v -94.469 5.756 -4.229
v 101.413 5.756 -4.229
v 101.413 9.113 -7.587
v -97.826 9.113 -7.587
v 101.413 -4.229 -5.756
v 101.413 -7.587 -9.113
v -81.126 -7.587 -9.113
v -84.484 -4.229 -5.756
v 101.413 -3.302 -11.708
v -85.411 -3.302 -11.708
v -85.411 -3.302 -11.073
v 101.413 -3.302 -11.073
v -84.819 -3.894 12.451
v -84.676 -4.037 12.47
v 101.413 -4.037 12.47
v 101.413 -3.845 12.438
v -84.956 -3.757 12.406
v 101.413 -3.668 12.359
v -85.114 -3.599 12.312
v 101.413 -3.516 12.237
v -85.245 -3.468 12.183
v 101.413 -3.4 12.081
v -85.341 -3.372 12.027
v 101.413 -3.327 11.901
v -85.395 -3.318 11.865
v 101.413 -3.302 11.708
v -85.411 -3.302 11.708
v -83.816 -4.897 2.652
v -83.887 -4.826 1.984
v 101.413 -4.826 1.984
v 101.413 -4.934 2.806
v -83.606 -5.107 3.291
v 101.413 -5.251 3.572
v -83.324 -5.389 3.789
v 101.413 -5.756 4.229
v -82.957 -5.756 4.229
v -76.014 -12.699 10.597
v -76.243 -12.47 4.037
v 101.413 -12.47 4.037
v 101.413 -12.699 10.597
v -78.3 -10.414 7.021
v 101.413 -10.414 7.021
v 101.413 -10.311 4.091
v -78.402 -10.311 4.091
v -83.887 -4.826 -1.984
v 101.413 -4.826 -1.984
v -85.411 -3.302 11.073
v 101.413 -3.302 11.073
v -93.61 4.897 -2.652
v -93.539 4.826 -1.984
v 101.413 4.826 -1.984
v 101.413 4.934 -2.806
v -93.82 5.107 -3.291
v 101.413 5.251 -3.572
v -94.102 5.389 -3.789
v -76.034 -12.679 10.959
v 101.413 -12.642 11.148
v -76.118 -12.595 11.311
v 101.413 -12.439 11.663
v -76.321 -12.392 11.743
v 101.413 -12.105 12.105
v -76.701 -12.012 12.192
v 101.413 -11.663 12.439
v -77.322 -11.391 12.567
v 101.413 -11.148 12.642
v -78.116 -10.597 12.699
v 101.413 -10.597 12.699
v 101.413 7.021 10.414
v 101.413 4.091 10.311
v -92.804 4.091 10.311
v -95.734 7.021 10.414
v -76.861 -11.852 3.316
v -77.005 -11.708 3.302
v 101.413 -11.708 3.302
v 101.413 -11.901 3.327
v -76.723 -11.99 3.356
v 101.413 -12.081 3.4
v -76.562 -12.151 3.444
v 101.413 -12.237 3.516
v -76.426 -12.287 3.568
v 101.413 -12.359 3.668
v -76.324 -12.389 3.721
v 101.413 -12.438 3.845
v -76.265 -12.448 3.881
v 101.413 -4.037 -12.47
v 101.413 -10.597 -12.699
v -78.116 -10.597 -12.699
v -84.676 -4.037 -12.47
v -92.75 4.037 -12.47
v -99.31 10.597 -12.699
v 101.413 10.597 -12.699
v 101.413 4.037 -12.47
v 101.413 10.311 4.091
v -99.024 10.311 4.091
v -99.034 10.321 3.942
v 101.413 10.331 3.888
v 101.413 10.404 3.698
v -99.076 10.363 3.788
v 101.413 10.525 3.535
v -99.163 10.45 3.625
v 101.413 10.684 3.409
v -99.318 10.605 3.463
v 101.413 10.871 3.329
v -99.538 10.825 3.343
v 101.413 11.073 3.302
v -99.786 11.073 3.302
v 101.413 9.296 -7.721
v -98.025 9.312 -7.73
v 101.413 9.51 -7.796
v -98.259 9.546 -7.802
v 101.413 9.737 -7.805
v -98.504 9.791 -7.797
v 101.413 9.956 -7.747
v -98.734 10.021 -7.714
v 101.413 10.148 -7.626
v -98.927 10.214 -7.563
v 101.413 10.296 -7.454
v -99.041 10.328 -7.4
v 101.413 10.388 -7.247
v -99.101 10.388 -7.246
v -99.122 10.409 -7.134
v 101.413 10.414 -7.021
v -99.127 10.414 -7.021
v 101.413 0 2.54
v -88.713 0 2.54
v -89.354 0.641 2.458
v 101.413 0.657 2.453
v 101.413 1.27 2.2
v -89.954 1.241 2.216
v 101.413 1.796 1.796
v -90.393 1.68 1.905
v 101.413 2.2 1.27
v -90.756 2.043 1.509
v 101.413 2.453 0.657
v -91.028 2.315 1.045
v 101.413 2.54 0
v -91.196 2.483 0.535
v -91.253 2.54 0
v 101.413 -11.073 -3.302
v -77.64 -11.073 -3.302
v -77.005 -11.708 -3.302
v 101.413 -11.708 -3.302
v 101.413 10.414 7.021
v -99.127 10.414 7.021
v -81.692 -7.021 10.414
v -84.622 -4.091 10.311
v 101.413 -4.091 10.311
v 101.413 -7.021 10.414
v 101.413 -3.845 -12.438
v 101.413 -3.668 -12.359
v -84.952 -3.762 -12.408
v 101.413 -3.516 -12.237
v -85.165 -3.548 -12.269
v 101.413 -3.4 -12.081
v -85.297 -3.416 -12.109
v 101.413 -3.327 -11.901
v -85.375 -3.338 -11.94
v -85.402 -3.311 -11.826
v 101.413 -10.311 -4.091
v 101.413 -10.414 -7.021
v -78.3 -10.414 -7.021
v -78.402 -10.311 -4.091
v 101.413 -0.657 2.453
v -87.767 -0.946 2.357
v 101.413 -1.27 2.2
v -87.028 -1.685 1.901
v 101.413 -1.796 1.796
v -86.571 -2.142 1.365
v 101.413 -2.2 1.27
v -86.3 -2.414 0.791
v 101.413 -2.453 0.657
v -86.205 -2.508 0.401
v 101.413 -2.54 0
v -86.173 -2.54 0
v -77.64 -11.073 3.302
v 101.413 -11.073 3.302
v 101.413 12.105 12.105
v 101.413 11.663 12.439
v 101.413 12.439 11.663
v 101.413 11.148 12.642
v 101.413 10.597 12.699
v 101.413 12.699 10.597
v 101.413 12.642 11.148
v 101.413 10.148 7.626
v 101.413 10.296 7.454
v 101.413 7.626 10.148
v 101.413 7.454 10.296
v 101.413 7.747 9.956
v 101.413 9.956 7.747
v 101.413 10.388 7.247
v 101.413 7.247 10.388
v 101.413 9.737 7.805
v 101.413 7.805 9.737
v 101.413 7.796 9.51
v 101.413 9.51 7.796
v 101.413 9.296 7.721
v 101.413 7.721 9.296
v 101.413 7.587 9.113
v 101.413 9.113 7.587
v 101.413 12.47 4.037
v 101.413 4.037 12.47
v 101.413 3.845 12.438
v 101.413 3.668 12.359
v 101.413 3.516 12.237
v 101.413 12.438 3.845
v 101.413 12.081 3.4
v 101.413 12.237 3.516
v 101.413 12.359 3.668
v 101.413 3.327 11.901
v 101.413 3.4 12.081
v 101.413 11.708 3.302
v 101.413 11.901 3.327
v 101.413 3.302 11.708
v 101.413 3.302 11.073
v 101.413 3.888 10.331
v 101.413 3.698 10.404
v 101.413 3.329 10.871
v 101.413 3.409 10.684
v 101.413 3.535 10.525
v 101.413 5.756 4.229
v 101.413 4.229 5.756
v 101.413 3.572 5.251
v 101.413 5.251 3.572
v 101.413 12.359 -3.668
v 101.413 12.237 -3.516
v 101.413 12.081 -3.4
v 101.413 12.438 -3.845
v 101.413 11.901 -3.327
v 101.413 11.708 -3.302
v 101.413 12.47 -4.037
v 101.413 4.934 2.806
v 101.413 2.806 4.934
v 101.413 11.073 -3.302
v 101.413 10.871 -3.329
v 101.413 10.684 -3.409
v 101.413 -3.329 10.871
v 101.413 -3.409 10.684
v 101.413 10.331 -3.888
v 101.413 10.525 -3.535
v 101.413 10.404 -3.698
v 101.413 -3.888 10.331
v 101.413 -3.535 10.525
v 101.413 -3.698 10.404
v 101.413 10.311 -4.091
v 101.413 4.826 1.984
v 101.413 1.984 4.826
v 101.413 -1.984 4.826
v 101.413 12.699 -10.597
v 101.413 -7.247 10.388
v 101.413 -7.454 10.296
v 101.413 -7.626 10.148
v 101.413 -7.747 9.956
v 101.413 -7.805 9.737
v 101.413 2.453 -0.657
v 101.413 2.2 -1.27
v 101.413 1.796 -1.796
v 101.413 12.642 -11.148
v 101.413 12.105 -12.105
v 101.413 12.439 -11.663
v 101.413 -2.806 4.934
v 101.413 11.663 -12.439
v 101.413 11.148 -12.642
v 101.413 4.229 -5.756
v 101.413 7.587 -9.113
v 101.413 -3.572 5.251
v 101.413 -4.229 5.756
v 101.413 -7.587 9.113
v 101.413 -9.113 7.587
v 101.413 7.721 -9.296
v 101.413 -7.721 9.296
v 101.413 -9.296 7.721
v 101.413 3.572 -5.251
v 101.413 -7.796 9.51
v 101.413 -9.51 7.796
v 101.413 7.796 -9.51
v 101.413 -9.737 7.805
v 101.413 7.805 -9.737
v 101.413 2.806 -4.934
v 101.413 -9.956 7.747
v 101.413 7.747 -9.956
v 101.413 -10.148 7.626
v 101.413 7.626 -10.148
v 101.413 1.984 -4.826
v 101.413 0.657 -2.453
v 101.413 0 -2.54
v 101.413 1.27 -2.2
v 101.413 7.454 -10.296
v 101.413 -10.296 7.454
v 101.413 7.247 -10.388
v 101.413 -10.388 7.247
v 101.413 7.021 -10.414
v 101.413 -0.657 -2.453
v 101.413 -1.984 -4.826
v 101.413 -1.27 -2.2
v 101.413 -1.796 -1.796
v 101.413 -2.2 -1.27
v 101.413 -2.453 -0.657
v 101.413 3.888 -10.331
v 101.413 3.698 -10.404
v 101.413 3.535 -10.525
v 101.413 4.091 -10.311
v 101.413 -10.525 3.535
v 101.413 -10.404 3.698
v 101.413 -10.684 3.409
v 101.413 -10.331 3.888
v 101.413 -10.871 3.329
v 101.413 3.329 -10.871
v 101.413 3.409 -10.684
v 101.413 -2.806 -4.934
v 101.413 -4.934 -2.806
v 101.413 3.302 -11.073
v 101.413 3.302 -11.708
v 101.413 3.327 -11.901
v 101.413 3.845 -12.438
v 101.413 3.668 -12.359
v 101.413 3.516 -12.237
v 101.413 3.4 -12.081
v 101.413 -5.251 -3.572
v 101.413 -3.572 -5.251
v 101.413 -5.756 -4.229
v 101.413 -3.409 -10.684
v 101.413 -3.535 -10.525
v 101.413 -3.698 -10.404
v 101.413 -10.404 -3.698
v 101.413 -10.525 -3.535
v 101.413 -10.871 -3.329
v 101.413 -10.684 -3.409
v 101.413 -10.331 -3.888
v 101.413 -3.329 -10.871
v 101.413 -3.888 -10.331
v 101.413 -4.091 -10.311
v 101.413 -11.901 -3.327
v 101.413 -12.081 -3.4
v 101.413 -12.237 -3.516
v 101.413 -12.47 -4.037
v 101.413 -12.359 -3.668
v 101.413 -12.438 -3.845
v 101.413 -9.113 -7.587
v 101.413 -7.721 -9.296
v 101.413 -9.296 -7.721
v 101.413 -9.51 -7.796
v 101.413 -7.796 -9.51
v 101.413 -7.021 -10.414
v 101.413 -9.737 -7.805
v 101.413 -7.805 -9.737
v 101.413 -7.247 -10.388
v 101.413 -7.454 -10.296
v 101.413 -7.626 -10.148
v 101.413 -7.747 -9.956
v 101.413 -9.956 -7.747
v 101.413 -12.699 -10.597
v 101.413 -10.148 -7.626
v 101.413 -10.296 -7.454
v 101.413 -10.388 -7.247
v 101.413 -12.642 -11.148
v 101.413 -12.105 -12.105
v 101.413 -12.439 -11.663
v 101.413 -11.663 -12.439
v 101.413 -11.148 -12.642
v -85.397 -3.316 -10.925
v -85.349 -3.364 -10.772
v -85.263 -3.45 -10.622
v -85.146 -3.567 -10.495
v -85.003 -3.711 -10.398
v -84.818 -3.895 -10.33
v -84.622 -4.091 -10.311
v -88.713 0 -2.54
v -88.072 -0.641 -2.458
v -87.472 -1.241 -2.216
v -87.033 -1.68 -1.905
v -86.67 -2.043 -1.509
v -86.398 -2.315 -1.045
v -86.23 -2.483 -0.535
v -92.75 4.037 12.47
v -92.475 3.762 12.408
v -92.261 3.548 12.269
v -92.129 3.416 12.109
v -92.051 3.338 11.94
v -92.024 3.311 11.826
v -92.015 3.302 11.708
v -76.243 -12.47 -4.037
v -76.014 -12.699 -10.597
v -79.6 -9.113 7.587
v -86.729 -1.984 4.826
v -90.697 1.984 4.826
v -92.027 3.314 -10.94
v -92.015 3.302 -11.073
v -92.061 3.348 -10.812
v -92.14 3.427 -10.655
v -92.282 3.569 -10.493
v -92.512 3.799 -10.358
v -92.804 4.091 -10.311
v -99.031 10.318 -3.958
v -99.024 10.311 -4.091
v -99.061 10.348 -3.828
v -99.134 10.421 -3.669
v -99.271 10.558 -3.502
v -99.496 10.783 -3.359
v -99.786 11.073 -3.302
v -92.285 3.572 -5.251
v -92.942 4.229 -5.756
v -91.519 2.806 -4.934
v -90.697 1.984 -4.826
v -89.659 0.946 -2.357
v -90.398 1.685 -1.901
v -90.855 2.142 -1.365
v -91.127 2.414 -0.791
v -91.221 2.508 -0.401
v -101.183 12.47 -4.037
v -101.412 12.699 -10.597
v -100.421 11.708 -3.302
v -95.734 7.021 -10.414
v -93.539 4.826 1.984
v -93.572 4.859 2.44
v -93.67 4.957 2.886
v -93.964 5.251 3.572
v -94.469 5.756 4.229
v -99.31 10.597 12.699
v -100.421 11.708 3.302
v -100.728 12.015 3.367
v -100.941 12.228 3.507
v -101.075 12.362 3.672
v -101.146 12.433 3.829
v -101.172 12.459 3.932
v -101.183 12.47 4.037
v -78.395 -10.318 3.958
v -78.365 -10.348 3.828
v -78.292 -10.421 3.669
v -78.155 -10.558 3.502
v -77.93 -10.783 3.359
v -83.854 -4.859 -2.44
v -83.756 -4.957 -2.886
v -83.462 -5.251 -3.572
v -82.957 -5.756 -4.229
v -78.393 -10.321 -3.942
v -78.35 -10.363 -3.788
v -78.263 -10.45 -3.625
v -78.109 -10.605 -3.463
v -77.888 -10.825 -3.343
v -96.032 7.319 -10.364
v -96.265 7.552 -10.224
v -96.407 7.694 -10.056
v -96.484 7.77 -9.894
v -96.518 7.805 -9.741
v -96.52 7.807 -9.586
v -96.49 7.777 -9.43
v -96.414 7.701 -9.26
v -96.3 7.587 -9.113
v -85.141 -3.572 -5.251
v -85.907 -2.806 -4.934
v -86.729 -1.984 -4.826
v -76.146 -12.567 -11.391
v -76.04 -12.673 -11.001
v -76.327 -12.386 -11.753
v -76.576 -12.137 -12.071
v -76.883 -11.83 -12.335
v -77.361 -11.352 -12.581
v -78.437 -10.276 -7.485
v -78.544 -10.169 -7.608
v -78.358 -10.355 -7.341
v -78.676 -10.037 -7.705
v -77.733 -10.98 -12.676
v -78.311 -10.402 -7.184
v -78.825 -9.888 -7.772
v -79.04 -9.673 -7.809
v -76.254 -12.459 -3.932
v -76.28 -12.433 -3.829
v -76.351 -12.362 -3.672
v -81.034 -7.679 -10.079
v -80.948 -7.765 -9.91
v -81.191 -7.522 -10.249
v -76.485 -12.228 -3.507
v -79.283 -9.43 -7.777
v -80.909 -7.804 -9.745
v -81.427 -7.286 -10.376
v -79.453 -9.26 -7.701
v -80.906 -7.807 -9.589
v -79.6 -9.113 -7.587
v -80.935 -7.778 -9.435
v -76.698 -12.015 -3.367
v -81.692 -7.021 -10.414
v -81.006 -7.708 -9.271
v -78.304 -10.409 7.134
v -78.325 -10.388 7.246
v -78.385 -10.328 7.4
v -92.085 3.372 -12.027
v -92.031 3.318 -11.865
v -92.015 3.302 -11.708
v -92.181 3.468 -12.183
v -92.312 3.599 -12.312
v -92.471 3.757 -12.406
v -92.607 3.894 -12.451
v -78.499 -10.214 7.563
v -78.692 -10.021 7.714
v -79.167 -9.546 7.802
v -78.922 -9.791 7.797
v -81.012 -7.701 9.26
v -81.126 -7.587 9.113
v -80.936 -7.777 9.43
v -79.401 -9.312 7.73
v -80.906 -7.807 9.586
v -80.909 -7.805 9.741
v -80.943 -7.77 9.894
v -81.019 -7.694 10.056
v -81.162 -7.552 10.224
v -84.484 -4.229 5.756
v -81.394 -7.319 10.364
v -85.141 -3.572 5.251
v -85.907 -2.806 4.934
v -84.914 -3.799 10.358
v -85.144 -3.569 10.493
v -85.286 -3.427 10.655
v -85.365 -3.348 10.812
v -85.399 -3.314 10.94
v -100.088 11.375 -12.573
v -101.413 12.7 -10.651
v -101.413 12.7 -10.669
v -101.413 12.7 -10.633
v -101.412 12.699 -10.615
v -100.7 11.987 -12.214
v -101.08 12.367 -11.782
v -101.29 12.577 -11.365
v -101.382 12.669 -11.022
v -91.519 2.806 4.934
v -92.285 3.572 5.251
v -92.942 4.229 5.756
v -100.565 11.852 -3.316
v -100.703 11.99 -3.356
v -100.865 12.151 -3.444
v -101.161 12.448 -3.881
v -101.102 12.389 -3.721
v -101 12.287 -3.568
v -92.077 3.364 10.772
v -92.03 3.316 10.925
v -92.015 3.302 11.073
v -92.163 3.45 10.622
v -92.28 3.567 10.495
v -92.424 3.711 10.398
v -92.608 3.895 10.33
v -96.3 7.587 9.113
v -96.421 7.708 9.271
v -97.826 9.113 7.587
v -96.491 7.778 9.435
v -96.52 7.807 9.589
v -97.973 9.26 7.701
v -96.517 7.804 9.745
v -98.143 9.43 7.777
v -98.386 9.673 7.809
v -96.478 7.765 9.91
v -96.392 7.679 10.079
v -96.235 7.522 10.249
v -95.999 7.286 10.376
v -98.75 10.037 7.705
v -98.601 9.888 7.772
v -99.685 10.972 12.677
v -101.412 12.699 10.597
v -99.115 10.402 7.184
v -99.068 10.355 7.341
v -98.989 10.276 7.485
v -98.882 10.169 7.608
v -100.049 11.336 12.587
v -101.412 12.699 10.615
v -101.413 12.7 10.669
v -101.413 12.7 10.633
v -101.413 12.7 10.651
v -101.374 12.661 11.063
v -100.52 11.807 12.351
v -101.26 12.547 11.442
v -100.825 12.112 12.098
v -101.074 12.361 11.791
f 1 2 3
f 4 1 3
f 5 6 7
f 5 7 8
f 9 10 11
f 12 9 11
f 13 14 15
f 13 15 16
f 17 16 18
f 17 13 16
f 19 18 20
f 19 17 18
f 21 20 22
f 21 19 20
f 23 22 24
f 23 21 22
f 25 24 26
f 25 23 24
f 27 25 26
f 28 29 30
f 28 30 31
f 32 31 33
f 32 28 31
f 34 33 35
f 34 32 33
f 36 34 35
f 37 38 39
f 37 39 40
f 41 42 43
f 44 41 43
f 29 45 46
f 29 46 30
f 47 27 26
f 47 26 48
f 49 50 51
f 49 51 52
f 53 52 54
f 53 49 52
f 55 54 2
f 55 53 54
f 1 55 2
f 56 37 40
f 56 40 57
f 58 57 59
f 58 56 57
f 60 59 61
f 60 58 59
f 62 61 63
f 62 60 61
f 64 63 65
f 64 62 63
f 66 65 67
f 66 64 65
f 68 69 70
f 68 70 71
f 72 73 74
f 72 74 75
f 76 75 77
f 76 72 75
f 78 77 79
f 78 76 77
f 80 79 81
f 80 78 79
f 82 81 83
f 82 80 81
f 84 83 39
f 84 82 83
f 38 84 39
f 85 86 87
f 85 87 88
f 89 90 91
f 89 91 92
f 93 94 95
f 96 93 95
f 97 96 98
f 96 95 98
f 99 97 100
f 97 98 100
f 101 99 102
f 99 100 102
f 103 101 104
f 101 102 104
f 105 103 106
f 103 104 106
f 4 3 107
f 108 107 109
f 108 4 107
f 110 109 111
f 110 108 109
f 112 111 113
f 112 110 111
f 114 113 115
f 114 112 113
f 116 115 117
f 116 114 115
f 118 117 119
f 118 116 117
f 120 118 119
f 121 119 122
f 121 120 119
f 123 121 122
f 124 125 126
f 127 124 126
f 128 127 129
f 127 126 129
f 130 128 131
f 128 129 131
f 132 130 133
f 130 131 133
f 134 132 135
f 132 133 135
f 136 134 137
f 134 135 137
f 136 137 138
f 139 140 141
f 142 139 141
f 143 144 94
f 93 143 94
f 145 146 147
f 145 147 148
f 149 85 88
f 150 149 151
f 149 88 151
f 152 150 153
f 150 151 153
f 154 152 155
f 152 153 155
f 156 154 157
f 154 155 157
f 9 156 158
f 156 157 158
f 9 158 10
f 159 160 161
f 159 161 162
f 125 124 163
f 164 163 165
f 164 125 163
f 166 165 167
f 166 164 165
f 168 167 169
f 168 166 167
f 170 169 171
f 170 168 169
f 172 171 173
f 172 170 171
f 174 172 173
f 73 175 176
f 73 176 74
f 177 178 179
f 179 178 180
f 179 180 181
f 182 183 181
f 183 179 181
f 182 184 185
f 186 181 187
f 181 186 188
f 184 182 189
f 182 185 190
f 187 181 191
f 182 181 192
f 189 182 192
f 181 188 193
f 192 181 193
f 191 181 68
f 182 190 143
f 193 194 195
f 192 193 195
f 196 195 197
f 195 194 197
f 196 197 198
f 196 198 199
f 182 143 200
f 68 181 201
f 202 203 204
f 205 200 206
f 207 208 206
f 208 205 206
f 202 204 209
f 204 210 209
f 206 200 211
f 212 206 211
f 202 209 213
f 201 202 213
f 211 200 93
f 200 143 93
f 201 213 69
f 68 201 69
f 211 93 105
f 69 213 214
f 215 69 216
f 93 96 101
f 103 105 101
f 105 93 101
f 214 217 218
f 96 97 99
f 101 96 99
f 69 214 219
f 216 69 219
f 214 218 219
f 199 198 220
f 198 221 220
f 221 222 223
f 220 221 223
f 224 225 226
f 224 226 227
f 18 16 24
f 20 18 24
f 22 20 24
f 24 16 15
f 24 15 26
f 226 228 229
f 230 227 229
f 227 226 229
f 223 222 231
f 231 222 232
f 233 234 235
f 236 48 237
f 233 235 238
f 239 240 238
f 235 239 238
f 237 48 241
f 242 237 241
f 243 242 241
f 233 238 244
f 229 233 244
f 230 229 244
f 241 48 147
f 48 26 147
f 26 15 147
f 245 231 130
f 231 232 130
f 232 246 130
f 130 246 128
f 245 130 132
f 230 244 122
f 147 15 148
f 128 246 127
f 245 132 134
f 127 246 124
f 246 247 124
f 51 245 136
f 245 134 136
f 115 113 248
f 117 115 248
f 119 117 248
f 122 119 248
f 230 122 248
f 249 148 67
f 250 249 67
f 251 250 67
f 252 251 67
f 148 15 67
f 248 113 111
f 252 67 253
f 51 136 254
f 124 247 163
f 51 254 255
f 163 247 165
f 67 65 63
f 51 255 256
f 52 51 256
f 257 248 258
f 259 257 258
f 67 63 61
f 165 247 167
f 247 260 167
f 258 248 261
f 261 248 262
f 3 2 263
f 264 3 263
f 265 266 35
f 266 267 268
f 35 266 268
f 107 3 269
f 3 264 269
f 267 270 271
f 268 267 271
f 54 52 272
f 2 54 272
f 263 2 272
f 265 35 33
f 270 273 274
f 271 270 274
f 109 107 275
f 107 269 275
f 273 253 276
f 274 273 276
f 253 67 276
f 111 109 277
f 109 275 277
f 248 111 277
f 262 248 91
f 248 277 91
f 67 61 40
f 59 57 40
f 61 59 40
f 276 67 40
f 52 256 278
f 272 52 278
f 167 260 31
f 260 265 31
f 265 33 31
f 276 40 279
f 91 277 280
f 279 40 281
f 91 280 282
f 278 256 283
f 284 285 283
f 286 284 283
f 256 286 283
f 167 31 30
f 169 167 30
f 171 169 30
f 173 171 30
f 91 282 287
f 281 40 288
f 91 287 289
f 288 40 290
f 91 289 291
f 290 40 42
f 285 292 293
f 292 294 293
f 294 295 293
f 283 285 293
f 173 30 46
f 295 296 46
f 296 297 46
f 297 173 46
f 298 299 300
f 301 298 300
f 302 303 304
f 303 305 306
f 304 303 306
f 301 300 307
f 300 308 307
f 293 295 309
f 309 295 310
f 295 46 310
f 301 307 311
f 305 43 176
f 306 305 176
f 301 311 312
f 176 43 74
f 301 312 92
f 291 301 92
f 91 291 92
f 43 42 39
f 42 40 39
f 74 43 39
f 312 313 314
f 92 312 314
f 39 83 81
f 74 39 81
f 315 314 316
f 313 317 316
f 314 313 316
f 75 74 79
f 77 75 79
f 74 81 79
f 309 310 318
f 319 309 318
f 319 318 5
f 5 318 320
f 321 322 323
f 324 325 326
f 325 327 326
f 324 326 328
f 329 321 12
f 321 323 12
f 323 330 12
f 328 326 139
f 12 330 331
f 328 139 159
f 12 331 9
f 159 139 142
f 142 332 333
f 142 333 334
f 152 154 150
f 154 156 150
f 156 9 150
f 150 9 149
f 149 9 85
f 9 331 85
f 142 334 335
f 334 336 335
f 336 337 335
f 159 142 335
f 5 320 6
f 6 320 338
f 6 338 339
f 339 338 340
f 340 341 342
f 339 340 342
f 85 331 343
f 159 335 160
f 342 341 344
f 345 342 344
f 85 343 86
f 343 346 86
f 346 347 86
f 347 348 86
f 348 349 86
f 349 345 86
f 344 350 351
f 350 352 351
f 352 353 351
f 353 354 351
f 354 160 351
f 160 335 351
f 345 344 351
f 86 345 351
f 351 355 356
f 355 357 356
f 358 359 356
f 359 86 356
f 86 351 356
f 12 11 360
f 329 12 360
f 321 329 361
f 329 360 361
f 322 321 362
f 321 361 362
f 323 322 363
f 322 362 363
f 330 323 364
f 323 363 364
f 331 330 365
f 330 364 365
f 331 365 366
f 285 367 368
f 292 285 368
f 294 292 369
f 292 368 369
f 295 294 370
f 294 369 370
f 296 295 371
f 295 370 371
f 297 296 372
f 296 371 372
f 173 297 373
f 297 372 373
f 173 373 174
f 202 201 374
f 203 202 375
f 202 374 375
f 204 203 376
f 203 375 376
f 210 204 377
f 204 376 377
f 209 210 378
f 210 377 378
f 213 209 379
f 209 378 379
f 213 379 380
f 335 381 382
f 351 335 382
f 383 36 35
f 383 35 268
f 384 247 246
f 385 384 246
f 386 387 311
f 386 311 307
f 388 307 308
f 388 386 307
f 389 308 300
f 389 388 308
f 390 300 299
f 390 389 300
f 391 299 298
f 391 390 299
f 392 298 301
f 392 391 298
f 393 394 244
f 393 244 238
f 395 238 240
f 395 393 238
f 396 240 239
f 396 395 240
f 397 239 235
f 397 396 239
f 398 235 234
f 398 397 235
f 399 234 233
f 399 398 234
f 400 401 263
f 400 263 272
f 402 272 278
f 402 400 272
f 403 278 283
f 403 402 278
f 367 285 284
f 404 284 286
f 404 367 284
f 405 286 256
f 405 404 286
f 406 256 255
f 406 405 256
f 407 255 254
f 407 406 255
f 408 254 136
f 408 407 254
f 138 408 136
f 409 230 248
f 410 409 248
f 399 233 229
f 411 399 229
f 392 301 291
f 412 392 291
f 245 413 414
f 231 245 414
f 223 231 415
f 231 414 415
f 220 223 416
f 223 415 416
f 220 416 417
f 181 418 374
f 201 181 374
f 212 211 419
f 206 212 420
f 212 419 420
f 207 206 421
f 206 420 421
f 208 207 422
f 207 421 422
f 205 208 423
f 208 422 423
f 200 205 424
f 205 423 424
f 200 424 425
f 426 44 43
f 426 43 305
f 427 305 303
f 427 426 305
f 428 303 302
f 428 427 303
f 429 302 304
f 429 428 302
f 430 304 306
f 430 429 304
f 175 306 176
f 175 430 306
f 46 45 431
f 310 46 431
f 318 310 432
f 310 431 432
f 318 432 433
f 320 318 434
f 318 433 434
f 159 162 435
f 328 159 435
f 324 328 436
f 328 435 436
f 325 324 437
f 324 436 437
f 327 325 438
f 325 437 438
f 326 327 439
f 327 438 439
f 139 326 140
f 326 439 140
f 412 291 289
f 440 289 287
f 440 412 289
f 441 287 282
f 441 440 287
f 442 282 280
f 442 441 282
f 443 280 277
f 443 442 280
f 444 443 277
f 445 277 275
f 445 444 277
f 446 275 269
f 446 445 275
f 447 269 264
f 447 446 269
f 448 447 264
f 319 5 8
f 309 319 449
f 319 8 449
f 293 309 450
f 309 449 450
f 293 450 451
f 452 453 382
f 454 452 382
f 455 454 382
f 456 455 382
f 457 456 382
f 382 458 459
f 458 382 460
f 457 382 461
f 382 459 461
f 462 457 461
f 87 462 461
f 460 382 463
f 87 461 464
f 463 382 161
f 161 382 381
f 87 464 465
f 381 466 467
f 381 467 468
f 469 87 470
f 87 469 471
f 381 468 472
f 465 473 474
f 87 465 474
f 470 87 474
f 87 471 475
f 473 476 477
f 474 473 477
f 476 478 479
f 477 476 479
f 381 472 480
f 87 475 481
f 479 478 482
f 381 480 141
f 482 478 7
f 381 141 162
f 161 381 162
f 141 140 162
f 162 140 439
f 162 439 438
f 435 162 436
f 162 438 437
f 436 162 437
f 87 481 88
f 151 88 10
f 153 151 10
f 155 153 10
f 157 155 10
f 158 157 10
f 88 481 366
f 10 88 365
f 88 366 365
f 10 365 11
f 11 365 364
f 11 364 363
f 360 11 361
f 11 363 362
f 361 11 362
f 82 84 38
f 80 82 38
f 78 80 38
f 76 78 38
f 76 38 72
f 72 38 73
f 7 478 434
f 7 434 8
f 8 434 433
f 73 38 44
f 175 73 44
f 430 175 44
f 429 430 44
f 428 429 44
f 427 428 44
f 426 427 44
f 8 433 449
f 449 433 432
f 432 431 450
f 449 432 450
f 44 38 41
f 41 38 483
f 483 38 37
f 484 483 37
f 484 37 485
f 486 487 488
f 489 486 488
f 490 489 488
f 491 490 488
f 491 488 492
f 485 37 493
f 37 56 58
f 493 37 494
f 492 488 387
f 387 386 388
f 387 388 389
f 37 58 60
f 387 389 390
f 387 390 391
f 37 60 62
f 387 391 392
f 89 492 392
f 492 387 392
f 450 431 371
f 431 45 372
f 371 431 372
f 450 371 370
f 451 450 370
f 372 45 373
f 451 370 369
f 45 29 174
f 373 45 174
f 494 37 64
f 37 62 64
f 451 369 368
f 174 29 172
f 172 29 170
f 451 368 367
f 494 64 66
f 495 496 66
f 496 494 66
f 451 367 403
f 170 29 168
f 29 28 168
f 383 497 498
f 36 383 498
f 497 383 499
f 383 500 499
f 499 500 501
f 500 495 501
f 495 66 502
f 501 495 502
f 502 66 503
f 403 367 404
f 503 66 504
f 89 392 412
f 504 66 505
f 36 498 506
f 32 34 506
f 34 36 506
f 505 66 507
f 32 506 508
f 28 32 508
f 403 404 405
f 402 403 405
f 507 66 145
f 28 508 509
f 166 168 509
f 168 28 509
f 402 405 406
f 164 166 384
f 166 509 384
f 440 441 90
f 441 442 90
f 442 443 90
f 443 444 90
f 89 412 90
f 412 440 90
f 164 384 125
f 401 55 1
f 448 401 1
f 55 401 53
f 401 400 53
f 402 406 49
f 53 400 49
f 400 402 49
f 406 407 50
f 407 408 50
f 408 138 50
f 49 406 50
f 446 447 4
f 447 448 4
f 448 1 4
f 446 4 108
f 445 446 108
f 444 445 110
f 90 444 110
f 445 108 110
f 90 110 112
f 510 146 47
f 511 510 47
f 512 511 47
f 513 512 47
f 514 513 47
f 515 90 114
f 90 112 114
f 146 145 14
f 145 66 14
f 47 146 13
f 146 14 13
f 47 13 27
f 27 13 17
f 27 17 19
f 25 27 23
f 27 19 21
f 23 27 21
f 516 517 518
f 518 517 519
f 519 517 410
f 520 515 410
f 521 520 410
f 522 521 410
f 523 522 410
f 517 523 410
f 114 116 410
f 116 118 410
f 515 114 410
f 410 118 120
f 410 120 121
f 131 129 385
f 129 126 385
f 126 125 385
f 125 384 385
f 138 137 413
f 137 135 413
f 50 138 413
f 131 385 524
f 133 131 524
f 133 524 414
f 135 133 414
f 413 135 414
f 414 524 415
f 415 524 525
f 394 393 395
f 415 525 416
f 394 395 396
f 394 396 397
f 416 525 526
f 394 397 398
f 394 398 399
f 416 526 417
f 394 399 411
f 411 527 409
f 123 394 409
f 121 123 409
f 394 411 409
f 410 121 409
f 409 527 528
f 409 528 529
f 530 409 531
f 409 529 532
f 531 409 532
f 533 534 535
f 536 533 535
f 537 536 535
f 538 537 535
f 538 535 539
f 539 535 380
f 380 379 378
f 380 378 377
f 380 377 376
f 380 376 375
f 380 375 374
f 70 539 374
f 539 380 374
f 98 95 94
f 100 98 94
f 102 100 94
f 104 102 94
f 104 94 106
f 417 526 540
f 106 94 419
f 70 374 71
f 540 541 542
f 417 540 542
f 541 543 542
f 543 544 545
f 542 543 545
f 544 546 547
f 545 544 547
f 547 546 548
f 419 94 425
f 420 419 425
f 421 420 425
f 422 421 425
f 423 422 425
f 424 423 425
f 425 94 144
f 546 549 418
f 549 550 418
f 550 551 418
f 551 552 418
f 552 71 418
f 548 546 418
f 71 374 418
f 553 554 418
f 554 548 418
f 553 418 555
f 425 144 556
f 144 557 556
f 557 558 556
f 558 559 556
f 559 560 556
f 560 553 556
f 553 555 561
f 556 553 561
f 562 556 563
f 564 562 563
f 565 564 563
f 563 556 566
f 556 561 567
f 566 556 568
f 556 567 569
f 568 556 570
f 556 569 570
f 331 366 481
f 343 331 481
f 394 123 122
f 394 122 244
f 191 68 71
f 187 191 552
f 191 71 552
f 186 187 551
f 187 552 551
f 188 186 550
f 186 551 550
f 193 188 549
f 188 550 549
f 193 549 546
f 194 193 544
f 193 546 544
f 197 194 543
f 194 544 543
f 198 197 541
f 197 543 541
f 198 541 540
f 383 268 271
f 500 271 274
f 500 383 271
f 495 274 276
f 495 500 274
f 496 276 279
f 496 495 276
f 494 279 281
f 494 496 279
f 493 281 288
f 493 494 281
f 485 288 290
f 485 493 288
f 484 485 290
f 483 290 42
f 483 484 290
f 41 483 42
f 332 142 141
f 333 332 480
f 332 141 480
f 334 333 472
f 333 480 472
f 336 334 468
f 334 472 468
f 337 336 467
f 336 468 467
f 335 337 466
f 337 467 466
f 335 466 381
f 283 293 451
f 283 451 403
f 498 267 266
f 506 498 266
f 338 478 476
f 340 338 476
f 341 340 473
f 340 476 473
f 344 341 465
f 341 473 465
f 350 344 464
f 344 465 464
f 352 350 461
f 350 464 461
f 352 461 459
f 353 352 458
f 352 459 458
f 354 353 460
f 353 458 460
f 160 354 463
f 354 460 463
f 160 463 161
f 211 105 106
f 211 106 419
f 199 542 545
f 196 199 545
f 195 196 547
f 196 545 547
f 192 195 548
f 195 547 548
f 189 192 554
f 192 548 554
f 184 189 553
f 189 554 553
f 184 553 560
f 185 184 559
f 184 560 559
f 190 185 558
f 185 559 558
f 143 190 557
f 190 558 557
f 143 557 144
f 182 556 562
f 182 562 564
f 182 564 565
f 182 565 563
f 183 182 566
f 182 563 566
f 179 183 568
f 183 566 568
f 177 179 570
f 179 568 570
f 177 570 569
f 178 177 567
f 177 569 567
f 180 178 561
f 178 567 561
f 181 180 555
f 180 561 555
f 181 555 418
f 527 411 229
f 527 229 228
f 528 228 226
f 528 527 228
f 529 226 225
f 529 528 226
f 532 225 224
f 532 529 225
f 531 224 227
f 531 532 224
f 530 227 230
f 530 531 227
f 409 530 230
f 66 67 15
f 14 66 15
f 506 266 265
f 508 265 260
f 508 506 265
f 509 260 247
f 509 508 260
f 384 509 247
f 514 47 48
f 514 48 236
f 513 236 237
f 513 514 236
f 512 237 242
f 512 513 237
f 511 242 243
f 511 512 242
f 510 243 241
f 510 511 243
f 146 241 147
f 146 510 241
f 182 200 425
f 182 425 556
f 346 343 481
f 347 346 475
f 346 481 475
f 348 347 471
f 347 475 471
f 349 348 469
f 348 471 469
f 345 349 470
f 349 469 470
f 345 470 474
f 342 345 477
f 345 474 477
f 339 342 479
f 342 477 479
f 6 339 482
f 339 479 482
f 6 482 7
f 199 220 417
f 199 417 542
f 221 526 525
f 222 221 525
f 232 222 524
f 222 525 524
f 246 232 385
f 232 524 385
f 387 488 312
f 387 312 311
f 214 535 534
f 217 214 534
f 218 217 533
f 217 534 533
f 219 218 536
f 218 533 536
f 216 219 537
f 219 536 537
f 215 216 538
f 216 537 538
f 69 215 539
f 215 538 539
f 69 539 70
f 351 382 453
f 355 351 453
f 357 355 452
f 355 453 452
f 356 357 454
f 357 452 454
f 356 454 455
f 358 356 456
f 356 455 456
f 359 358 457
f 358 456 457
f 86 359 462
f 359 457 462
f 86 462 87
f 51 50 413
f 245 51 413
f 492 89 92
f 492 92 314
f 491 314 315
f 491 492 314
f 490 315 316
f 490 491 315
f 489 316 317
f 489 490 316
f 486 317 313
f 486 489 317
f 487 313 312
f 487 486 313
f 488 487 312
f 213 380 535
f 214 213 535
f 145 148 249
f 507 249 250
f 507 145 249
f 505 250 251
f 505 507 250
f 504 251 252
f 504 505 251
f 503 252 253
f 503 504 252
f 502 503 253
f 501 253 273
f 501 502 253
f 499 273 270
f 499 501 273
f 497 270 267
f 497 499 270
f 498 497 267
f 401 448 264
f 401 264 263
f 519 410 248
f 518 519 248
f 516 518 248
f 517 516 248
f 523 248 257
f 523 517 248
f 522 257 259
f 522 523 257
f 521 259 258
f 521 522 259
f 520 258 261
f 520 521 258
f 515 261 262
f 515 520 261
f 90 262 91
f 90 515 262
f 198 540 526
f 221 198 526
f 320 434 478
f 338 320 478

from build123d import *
from OCP.BRepAlgoAPI import BRepAlgoAPI_Cut
from OCP.TopTools import TopTools_ListOfShape

# Parameters (mm, degrees)
BOSS_EXTRUDE1_DEPTH      = 101.413073
BOSS_EXTRUDE1_DEPTH_BACK = 101.413073
CUT_EXTRUDE7_DEPTH       = 115.133874793


with BuildPart() as part:
    # Sketch3 → Boss-Extrude1 (new, two sides: drawn at the far end of the back side and taken through both)
    with BuildSketch(Plane(origin=(0, 0, 0), x_dir=(0, 0, -1), z_dir=(1, 0, 0)).offset(-BOSS_EXTRUDE1_DEPTH_BACK)):
        with BuildLine():
            Line((0, 4.826), (1.984228399, 4.826))
            ThreePointArc((1.984228399, 4.826), (3.199248297, 5.067682484), (4.229292429, 5.75593597))
            Line((4.229292429, 5.75593597), (7.586577723, 9.113221264))
            ThreePointArc((7.586577723, 9.113221264), (7.746562132, 9.955883421), (7.021168939, 10.413572441))
            Line((7.021168939, 10.413572441), (4.090593416, 10.311234489))
            ThreePointArc((4.090593416, 10.311234489), (3.534670322, 10.524633371), (3.302, 11.072770299))
            Line((3.302, 11.072770299), (3.302, 11.70815736))
            ThreePointArc((3.302, 11.70815736), (3.515863072, 12.237487038), (4.037406584, 12.46969317))
            Line((4.037406584, 12.46969317), (10.597084223, 12.698762161))
            ThreePointArc((10.597084223, 12.698762161), (12.104840979, 12.104840979), (12.698762161, 10.597084223))
            Line((12.698762161, 10.597084223), (12.46969317, 4.037406584))
            ThreePointArc((12.46969317, 4.037406584), (12.237487038, 3.515863072), (11.70815736, 3.302))
            Line((11.70815736, 3.302), (11.072770299, 3.302))
            ThreePointArc((11.072770299, 3.302), (10.524633371, 3.534670322), (10.311234489, 4.090593416))
            Line((10.311234489, 4.090593416), (10.413572441, 7.021168939))
            ThreePointArc((10.413572441, 7.021168939), (9.955883421, 7.746562132), (9.113221264, 7.586577723))
            Line((9.113221264, 7.586577723), (5.75593597, 4.229292429))
            ThreePointArc((5.75593597, 4.229292429), (5.067682484, 3.199248297), (4.826, 1.984228399))
            Line((4.826, 1.984228399), (4.826, 0))
            Line((4.826, 0), (2.54, 0))
            ThreePointArc((2.54, 0), (1.796051224, 1.796051224), (0, 2.54))
            Line((0, 2.54), (0, 4.826))
        make_face()
    extrude(amount=BOSS_EXTRUDE1_DEPTH + BOSS_EXTRUDE1_DEPTH_BACK)

    # Mirror1: part across plane


with BuildPart() as part_1:
    add(part.part)
    add(part.part.mirror(Plane.ZX))

    # Mirror2: part across plane


with BuildPart() as part_2:
    add(part_1.part)
    add(part_1.part.mirror(Plane.XY))


with BuildPart() as cut_extrude7_tool:
    # Sketch10 → Cut-Extrude7 (new, through all)
    with BuildSketch(Plane.XY.offset(38.1)):
        Polygon((-76.013073399, -12.7), (-101.413073399, 12.7), (-101.413073399, -12.7), align=None)
        Polygon((-76.013073399, -12.7), (-101.413073399, -12.7), (-101.413073399, 12.7), (-106.454619086, 17.741545687), (-105.960543128, -16.167906454), (-72.545166945, -16.167906454), align=None)
    extrude(amount=-CUT_EXTRUDE7_DEPTH)


with BuildPart() as part_3:
    add(part_2.part)

    # Cut-Extrude7: cut by cut_extrude7_tool, with a tolerance
    cut_extrude7_stock = TopTools_ListOfShape()
    cut_extrude7_stock.Append(part_3.part.wrapped)
    cut_extrude7_tools = TopTools_ListOfShape()
    cut_extrude7_tools.Append(cut_extrude7_tool.part.wrapped)
    cut_extrude7_cut = BRepAlgoAPI_Cut()
    cut_extrude7_cut.SetArguments(cut_extrude7_stock)
    cut_extrude7_cut.SetTools(cut_extrude7_tools)
    cut_extrude7_cut.SetFuzzyValue(0.00001)
    cut_extrude7_cut.Build()
    add(Compound.cast(cut_extrude7_cut.Shape()).solids(), mode=Mode.REPLACE)


solid = part_3.part
